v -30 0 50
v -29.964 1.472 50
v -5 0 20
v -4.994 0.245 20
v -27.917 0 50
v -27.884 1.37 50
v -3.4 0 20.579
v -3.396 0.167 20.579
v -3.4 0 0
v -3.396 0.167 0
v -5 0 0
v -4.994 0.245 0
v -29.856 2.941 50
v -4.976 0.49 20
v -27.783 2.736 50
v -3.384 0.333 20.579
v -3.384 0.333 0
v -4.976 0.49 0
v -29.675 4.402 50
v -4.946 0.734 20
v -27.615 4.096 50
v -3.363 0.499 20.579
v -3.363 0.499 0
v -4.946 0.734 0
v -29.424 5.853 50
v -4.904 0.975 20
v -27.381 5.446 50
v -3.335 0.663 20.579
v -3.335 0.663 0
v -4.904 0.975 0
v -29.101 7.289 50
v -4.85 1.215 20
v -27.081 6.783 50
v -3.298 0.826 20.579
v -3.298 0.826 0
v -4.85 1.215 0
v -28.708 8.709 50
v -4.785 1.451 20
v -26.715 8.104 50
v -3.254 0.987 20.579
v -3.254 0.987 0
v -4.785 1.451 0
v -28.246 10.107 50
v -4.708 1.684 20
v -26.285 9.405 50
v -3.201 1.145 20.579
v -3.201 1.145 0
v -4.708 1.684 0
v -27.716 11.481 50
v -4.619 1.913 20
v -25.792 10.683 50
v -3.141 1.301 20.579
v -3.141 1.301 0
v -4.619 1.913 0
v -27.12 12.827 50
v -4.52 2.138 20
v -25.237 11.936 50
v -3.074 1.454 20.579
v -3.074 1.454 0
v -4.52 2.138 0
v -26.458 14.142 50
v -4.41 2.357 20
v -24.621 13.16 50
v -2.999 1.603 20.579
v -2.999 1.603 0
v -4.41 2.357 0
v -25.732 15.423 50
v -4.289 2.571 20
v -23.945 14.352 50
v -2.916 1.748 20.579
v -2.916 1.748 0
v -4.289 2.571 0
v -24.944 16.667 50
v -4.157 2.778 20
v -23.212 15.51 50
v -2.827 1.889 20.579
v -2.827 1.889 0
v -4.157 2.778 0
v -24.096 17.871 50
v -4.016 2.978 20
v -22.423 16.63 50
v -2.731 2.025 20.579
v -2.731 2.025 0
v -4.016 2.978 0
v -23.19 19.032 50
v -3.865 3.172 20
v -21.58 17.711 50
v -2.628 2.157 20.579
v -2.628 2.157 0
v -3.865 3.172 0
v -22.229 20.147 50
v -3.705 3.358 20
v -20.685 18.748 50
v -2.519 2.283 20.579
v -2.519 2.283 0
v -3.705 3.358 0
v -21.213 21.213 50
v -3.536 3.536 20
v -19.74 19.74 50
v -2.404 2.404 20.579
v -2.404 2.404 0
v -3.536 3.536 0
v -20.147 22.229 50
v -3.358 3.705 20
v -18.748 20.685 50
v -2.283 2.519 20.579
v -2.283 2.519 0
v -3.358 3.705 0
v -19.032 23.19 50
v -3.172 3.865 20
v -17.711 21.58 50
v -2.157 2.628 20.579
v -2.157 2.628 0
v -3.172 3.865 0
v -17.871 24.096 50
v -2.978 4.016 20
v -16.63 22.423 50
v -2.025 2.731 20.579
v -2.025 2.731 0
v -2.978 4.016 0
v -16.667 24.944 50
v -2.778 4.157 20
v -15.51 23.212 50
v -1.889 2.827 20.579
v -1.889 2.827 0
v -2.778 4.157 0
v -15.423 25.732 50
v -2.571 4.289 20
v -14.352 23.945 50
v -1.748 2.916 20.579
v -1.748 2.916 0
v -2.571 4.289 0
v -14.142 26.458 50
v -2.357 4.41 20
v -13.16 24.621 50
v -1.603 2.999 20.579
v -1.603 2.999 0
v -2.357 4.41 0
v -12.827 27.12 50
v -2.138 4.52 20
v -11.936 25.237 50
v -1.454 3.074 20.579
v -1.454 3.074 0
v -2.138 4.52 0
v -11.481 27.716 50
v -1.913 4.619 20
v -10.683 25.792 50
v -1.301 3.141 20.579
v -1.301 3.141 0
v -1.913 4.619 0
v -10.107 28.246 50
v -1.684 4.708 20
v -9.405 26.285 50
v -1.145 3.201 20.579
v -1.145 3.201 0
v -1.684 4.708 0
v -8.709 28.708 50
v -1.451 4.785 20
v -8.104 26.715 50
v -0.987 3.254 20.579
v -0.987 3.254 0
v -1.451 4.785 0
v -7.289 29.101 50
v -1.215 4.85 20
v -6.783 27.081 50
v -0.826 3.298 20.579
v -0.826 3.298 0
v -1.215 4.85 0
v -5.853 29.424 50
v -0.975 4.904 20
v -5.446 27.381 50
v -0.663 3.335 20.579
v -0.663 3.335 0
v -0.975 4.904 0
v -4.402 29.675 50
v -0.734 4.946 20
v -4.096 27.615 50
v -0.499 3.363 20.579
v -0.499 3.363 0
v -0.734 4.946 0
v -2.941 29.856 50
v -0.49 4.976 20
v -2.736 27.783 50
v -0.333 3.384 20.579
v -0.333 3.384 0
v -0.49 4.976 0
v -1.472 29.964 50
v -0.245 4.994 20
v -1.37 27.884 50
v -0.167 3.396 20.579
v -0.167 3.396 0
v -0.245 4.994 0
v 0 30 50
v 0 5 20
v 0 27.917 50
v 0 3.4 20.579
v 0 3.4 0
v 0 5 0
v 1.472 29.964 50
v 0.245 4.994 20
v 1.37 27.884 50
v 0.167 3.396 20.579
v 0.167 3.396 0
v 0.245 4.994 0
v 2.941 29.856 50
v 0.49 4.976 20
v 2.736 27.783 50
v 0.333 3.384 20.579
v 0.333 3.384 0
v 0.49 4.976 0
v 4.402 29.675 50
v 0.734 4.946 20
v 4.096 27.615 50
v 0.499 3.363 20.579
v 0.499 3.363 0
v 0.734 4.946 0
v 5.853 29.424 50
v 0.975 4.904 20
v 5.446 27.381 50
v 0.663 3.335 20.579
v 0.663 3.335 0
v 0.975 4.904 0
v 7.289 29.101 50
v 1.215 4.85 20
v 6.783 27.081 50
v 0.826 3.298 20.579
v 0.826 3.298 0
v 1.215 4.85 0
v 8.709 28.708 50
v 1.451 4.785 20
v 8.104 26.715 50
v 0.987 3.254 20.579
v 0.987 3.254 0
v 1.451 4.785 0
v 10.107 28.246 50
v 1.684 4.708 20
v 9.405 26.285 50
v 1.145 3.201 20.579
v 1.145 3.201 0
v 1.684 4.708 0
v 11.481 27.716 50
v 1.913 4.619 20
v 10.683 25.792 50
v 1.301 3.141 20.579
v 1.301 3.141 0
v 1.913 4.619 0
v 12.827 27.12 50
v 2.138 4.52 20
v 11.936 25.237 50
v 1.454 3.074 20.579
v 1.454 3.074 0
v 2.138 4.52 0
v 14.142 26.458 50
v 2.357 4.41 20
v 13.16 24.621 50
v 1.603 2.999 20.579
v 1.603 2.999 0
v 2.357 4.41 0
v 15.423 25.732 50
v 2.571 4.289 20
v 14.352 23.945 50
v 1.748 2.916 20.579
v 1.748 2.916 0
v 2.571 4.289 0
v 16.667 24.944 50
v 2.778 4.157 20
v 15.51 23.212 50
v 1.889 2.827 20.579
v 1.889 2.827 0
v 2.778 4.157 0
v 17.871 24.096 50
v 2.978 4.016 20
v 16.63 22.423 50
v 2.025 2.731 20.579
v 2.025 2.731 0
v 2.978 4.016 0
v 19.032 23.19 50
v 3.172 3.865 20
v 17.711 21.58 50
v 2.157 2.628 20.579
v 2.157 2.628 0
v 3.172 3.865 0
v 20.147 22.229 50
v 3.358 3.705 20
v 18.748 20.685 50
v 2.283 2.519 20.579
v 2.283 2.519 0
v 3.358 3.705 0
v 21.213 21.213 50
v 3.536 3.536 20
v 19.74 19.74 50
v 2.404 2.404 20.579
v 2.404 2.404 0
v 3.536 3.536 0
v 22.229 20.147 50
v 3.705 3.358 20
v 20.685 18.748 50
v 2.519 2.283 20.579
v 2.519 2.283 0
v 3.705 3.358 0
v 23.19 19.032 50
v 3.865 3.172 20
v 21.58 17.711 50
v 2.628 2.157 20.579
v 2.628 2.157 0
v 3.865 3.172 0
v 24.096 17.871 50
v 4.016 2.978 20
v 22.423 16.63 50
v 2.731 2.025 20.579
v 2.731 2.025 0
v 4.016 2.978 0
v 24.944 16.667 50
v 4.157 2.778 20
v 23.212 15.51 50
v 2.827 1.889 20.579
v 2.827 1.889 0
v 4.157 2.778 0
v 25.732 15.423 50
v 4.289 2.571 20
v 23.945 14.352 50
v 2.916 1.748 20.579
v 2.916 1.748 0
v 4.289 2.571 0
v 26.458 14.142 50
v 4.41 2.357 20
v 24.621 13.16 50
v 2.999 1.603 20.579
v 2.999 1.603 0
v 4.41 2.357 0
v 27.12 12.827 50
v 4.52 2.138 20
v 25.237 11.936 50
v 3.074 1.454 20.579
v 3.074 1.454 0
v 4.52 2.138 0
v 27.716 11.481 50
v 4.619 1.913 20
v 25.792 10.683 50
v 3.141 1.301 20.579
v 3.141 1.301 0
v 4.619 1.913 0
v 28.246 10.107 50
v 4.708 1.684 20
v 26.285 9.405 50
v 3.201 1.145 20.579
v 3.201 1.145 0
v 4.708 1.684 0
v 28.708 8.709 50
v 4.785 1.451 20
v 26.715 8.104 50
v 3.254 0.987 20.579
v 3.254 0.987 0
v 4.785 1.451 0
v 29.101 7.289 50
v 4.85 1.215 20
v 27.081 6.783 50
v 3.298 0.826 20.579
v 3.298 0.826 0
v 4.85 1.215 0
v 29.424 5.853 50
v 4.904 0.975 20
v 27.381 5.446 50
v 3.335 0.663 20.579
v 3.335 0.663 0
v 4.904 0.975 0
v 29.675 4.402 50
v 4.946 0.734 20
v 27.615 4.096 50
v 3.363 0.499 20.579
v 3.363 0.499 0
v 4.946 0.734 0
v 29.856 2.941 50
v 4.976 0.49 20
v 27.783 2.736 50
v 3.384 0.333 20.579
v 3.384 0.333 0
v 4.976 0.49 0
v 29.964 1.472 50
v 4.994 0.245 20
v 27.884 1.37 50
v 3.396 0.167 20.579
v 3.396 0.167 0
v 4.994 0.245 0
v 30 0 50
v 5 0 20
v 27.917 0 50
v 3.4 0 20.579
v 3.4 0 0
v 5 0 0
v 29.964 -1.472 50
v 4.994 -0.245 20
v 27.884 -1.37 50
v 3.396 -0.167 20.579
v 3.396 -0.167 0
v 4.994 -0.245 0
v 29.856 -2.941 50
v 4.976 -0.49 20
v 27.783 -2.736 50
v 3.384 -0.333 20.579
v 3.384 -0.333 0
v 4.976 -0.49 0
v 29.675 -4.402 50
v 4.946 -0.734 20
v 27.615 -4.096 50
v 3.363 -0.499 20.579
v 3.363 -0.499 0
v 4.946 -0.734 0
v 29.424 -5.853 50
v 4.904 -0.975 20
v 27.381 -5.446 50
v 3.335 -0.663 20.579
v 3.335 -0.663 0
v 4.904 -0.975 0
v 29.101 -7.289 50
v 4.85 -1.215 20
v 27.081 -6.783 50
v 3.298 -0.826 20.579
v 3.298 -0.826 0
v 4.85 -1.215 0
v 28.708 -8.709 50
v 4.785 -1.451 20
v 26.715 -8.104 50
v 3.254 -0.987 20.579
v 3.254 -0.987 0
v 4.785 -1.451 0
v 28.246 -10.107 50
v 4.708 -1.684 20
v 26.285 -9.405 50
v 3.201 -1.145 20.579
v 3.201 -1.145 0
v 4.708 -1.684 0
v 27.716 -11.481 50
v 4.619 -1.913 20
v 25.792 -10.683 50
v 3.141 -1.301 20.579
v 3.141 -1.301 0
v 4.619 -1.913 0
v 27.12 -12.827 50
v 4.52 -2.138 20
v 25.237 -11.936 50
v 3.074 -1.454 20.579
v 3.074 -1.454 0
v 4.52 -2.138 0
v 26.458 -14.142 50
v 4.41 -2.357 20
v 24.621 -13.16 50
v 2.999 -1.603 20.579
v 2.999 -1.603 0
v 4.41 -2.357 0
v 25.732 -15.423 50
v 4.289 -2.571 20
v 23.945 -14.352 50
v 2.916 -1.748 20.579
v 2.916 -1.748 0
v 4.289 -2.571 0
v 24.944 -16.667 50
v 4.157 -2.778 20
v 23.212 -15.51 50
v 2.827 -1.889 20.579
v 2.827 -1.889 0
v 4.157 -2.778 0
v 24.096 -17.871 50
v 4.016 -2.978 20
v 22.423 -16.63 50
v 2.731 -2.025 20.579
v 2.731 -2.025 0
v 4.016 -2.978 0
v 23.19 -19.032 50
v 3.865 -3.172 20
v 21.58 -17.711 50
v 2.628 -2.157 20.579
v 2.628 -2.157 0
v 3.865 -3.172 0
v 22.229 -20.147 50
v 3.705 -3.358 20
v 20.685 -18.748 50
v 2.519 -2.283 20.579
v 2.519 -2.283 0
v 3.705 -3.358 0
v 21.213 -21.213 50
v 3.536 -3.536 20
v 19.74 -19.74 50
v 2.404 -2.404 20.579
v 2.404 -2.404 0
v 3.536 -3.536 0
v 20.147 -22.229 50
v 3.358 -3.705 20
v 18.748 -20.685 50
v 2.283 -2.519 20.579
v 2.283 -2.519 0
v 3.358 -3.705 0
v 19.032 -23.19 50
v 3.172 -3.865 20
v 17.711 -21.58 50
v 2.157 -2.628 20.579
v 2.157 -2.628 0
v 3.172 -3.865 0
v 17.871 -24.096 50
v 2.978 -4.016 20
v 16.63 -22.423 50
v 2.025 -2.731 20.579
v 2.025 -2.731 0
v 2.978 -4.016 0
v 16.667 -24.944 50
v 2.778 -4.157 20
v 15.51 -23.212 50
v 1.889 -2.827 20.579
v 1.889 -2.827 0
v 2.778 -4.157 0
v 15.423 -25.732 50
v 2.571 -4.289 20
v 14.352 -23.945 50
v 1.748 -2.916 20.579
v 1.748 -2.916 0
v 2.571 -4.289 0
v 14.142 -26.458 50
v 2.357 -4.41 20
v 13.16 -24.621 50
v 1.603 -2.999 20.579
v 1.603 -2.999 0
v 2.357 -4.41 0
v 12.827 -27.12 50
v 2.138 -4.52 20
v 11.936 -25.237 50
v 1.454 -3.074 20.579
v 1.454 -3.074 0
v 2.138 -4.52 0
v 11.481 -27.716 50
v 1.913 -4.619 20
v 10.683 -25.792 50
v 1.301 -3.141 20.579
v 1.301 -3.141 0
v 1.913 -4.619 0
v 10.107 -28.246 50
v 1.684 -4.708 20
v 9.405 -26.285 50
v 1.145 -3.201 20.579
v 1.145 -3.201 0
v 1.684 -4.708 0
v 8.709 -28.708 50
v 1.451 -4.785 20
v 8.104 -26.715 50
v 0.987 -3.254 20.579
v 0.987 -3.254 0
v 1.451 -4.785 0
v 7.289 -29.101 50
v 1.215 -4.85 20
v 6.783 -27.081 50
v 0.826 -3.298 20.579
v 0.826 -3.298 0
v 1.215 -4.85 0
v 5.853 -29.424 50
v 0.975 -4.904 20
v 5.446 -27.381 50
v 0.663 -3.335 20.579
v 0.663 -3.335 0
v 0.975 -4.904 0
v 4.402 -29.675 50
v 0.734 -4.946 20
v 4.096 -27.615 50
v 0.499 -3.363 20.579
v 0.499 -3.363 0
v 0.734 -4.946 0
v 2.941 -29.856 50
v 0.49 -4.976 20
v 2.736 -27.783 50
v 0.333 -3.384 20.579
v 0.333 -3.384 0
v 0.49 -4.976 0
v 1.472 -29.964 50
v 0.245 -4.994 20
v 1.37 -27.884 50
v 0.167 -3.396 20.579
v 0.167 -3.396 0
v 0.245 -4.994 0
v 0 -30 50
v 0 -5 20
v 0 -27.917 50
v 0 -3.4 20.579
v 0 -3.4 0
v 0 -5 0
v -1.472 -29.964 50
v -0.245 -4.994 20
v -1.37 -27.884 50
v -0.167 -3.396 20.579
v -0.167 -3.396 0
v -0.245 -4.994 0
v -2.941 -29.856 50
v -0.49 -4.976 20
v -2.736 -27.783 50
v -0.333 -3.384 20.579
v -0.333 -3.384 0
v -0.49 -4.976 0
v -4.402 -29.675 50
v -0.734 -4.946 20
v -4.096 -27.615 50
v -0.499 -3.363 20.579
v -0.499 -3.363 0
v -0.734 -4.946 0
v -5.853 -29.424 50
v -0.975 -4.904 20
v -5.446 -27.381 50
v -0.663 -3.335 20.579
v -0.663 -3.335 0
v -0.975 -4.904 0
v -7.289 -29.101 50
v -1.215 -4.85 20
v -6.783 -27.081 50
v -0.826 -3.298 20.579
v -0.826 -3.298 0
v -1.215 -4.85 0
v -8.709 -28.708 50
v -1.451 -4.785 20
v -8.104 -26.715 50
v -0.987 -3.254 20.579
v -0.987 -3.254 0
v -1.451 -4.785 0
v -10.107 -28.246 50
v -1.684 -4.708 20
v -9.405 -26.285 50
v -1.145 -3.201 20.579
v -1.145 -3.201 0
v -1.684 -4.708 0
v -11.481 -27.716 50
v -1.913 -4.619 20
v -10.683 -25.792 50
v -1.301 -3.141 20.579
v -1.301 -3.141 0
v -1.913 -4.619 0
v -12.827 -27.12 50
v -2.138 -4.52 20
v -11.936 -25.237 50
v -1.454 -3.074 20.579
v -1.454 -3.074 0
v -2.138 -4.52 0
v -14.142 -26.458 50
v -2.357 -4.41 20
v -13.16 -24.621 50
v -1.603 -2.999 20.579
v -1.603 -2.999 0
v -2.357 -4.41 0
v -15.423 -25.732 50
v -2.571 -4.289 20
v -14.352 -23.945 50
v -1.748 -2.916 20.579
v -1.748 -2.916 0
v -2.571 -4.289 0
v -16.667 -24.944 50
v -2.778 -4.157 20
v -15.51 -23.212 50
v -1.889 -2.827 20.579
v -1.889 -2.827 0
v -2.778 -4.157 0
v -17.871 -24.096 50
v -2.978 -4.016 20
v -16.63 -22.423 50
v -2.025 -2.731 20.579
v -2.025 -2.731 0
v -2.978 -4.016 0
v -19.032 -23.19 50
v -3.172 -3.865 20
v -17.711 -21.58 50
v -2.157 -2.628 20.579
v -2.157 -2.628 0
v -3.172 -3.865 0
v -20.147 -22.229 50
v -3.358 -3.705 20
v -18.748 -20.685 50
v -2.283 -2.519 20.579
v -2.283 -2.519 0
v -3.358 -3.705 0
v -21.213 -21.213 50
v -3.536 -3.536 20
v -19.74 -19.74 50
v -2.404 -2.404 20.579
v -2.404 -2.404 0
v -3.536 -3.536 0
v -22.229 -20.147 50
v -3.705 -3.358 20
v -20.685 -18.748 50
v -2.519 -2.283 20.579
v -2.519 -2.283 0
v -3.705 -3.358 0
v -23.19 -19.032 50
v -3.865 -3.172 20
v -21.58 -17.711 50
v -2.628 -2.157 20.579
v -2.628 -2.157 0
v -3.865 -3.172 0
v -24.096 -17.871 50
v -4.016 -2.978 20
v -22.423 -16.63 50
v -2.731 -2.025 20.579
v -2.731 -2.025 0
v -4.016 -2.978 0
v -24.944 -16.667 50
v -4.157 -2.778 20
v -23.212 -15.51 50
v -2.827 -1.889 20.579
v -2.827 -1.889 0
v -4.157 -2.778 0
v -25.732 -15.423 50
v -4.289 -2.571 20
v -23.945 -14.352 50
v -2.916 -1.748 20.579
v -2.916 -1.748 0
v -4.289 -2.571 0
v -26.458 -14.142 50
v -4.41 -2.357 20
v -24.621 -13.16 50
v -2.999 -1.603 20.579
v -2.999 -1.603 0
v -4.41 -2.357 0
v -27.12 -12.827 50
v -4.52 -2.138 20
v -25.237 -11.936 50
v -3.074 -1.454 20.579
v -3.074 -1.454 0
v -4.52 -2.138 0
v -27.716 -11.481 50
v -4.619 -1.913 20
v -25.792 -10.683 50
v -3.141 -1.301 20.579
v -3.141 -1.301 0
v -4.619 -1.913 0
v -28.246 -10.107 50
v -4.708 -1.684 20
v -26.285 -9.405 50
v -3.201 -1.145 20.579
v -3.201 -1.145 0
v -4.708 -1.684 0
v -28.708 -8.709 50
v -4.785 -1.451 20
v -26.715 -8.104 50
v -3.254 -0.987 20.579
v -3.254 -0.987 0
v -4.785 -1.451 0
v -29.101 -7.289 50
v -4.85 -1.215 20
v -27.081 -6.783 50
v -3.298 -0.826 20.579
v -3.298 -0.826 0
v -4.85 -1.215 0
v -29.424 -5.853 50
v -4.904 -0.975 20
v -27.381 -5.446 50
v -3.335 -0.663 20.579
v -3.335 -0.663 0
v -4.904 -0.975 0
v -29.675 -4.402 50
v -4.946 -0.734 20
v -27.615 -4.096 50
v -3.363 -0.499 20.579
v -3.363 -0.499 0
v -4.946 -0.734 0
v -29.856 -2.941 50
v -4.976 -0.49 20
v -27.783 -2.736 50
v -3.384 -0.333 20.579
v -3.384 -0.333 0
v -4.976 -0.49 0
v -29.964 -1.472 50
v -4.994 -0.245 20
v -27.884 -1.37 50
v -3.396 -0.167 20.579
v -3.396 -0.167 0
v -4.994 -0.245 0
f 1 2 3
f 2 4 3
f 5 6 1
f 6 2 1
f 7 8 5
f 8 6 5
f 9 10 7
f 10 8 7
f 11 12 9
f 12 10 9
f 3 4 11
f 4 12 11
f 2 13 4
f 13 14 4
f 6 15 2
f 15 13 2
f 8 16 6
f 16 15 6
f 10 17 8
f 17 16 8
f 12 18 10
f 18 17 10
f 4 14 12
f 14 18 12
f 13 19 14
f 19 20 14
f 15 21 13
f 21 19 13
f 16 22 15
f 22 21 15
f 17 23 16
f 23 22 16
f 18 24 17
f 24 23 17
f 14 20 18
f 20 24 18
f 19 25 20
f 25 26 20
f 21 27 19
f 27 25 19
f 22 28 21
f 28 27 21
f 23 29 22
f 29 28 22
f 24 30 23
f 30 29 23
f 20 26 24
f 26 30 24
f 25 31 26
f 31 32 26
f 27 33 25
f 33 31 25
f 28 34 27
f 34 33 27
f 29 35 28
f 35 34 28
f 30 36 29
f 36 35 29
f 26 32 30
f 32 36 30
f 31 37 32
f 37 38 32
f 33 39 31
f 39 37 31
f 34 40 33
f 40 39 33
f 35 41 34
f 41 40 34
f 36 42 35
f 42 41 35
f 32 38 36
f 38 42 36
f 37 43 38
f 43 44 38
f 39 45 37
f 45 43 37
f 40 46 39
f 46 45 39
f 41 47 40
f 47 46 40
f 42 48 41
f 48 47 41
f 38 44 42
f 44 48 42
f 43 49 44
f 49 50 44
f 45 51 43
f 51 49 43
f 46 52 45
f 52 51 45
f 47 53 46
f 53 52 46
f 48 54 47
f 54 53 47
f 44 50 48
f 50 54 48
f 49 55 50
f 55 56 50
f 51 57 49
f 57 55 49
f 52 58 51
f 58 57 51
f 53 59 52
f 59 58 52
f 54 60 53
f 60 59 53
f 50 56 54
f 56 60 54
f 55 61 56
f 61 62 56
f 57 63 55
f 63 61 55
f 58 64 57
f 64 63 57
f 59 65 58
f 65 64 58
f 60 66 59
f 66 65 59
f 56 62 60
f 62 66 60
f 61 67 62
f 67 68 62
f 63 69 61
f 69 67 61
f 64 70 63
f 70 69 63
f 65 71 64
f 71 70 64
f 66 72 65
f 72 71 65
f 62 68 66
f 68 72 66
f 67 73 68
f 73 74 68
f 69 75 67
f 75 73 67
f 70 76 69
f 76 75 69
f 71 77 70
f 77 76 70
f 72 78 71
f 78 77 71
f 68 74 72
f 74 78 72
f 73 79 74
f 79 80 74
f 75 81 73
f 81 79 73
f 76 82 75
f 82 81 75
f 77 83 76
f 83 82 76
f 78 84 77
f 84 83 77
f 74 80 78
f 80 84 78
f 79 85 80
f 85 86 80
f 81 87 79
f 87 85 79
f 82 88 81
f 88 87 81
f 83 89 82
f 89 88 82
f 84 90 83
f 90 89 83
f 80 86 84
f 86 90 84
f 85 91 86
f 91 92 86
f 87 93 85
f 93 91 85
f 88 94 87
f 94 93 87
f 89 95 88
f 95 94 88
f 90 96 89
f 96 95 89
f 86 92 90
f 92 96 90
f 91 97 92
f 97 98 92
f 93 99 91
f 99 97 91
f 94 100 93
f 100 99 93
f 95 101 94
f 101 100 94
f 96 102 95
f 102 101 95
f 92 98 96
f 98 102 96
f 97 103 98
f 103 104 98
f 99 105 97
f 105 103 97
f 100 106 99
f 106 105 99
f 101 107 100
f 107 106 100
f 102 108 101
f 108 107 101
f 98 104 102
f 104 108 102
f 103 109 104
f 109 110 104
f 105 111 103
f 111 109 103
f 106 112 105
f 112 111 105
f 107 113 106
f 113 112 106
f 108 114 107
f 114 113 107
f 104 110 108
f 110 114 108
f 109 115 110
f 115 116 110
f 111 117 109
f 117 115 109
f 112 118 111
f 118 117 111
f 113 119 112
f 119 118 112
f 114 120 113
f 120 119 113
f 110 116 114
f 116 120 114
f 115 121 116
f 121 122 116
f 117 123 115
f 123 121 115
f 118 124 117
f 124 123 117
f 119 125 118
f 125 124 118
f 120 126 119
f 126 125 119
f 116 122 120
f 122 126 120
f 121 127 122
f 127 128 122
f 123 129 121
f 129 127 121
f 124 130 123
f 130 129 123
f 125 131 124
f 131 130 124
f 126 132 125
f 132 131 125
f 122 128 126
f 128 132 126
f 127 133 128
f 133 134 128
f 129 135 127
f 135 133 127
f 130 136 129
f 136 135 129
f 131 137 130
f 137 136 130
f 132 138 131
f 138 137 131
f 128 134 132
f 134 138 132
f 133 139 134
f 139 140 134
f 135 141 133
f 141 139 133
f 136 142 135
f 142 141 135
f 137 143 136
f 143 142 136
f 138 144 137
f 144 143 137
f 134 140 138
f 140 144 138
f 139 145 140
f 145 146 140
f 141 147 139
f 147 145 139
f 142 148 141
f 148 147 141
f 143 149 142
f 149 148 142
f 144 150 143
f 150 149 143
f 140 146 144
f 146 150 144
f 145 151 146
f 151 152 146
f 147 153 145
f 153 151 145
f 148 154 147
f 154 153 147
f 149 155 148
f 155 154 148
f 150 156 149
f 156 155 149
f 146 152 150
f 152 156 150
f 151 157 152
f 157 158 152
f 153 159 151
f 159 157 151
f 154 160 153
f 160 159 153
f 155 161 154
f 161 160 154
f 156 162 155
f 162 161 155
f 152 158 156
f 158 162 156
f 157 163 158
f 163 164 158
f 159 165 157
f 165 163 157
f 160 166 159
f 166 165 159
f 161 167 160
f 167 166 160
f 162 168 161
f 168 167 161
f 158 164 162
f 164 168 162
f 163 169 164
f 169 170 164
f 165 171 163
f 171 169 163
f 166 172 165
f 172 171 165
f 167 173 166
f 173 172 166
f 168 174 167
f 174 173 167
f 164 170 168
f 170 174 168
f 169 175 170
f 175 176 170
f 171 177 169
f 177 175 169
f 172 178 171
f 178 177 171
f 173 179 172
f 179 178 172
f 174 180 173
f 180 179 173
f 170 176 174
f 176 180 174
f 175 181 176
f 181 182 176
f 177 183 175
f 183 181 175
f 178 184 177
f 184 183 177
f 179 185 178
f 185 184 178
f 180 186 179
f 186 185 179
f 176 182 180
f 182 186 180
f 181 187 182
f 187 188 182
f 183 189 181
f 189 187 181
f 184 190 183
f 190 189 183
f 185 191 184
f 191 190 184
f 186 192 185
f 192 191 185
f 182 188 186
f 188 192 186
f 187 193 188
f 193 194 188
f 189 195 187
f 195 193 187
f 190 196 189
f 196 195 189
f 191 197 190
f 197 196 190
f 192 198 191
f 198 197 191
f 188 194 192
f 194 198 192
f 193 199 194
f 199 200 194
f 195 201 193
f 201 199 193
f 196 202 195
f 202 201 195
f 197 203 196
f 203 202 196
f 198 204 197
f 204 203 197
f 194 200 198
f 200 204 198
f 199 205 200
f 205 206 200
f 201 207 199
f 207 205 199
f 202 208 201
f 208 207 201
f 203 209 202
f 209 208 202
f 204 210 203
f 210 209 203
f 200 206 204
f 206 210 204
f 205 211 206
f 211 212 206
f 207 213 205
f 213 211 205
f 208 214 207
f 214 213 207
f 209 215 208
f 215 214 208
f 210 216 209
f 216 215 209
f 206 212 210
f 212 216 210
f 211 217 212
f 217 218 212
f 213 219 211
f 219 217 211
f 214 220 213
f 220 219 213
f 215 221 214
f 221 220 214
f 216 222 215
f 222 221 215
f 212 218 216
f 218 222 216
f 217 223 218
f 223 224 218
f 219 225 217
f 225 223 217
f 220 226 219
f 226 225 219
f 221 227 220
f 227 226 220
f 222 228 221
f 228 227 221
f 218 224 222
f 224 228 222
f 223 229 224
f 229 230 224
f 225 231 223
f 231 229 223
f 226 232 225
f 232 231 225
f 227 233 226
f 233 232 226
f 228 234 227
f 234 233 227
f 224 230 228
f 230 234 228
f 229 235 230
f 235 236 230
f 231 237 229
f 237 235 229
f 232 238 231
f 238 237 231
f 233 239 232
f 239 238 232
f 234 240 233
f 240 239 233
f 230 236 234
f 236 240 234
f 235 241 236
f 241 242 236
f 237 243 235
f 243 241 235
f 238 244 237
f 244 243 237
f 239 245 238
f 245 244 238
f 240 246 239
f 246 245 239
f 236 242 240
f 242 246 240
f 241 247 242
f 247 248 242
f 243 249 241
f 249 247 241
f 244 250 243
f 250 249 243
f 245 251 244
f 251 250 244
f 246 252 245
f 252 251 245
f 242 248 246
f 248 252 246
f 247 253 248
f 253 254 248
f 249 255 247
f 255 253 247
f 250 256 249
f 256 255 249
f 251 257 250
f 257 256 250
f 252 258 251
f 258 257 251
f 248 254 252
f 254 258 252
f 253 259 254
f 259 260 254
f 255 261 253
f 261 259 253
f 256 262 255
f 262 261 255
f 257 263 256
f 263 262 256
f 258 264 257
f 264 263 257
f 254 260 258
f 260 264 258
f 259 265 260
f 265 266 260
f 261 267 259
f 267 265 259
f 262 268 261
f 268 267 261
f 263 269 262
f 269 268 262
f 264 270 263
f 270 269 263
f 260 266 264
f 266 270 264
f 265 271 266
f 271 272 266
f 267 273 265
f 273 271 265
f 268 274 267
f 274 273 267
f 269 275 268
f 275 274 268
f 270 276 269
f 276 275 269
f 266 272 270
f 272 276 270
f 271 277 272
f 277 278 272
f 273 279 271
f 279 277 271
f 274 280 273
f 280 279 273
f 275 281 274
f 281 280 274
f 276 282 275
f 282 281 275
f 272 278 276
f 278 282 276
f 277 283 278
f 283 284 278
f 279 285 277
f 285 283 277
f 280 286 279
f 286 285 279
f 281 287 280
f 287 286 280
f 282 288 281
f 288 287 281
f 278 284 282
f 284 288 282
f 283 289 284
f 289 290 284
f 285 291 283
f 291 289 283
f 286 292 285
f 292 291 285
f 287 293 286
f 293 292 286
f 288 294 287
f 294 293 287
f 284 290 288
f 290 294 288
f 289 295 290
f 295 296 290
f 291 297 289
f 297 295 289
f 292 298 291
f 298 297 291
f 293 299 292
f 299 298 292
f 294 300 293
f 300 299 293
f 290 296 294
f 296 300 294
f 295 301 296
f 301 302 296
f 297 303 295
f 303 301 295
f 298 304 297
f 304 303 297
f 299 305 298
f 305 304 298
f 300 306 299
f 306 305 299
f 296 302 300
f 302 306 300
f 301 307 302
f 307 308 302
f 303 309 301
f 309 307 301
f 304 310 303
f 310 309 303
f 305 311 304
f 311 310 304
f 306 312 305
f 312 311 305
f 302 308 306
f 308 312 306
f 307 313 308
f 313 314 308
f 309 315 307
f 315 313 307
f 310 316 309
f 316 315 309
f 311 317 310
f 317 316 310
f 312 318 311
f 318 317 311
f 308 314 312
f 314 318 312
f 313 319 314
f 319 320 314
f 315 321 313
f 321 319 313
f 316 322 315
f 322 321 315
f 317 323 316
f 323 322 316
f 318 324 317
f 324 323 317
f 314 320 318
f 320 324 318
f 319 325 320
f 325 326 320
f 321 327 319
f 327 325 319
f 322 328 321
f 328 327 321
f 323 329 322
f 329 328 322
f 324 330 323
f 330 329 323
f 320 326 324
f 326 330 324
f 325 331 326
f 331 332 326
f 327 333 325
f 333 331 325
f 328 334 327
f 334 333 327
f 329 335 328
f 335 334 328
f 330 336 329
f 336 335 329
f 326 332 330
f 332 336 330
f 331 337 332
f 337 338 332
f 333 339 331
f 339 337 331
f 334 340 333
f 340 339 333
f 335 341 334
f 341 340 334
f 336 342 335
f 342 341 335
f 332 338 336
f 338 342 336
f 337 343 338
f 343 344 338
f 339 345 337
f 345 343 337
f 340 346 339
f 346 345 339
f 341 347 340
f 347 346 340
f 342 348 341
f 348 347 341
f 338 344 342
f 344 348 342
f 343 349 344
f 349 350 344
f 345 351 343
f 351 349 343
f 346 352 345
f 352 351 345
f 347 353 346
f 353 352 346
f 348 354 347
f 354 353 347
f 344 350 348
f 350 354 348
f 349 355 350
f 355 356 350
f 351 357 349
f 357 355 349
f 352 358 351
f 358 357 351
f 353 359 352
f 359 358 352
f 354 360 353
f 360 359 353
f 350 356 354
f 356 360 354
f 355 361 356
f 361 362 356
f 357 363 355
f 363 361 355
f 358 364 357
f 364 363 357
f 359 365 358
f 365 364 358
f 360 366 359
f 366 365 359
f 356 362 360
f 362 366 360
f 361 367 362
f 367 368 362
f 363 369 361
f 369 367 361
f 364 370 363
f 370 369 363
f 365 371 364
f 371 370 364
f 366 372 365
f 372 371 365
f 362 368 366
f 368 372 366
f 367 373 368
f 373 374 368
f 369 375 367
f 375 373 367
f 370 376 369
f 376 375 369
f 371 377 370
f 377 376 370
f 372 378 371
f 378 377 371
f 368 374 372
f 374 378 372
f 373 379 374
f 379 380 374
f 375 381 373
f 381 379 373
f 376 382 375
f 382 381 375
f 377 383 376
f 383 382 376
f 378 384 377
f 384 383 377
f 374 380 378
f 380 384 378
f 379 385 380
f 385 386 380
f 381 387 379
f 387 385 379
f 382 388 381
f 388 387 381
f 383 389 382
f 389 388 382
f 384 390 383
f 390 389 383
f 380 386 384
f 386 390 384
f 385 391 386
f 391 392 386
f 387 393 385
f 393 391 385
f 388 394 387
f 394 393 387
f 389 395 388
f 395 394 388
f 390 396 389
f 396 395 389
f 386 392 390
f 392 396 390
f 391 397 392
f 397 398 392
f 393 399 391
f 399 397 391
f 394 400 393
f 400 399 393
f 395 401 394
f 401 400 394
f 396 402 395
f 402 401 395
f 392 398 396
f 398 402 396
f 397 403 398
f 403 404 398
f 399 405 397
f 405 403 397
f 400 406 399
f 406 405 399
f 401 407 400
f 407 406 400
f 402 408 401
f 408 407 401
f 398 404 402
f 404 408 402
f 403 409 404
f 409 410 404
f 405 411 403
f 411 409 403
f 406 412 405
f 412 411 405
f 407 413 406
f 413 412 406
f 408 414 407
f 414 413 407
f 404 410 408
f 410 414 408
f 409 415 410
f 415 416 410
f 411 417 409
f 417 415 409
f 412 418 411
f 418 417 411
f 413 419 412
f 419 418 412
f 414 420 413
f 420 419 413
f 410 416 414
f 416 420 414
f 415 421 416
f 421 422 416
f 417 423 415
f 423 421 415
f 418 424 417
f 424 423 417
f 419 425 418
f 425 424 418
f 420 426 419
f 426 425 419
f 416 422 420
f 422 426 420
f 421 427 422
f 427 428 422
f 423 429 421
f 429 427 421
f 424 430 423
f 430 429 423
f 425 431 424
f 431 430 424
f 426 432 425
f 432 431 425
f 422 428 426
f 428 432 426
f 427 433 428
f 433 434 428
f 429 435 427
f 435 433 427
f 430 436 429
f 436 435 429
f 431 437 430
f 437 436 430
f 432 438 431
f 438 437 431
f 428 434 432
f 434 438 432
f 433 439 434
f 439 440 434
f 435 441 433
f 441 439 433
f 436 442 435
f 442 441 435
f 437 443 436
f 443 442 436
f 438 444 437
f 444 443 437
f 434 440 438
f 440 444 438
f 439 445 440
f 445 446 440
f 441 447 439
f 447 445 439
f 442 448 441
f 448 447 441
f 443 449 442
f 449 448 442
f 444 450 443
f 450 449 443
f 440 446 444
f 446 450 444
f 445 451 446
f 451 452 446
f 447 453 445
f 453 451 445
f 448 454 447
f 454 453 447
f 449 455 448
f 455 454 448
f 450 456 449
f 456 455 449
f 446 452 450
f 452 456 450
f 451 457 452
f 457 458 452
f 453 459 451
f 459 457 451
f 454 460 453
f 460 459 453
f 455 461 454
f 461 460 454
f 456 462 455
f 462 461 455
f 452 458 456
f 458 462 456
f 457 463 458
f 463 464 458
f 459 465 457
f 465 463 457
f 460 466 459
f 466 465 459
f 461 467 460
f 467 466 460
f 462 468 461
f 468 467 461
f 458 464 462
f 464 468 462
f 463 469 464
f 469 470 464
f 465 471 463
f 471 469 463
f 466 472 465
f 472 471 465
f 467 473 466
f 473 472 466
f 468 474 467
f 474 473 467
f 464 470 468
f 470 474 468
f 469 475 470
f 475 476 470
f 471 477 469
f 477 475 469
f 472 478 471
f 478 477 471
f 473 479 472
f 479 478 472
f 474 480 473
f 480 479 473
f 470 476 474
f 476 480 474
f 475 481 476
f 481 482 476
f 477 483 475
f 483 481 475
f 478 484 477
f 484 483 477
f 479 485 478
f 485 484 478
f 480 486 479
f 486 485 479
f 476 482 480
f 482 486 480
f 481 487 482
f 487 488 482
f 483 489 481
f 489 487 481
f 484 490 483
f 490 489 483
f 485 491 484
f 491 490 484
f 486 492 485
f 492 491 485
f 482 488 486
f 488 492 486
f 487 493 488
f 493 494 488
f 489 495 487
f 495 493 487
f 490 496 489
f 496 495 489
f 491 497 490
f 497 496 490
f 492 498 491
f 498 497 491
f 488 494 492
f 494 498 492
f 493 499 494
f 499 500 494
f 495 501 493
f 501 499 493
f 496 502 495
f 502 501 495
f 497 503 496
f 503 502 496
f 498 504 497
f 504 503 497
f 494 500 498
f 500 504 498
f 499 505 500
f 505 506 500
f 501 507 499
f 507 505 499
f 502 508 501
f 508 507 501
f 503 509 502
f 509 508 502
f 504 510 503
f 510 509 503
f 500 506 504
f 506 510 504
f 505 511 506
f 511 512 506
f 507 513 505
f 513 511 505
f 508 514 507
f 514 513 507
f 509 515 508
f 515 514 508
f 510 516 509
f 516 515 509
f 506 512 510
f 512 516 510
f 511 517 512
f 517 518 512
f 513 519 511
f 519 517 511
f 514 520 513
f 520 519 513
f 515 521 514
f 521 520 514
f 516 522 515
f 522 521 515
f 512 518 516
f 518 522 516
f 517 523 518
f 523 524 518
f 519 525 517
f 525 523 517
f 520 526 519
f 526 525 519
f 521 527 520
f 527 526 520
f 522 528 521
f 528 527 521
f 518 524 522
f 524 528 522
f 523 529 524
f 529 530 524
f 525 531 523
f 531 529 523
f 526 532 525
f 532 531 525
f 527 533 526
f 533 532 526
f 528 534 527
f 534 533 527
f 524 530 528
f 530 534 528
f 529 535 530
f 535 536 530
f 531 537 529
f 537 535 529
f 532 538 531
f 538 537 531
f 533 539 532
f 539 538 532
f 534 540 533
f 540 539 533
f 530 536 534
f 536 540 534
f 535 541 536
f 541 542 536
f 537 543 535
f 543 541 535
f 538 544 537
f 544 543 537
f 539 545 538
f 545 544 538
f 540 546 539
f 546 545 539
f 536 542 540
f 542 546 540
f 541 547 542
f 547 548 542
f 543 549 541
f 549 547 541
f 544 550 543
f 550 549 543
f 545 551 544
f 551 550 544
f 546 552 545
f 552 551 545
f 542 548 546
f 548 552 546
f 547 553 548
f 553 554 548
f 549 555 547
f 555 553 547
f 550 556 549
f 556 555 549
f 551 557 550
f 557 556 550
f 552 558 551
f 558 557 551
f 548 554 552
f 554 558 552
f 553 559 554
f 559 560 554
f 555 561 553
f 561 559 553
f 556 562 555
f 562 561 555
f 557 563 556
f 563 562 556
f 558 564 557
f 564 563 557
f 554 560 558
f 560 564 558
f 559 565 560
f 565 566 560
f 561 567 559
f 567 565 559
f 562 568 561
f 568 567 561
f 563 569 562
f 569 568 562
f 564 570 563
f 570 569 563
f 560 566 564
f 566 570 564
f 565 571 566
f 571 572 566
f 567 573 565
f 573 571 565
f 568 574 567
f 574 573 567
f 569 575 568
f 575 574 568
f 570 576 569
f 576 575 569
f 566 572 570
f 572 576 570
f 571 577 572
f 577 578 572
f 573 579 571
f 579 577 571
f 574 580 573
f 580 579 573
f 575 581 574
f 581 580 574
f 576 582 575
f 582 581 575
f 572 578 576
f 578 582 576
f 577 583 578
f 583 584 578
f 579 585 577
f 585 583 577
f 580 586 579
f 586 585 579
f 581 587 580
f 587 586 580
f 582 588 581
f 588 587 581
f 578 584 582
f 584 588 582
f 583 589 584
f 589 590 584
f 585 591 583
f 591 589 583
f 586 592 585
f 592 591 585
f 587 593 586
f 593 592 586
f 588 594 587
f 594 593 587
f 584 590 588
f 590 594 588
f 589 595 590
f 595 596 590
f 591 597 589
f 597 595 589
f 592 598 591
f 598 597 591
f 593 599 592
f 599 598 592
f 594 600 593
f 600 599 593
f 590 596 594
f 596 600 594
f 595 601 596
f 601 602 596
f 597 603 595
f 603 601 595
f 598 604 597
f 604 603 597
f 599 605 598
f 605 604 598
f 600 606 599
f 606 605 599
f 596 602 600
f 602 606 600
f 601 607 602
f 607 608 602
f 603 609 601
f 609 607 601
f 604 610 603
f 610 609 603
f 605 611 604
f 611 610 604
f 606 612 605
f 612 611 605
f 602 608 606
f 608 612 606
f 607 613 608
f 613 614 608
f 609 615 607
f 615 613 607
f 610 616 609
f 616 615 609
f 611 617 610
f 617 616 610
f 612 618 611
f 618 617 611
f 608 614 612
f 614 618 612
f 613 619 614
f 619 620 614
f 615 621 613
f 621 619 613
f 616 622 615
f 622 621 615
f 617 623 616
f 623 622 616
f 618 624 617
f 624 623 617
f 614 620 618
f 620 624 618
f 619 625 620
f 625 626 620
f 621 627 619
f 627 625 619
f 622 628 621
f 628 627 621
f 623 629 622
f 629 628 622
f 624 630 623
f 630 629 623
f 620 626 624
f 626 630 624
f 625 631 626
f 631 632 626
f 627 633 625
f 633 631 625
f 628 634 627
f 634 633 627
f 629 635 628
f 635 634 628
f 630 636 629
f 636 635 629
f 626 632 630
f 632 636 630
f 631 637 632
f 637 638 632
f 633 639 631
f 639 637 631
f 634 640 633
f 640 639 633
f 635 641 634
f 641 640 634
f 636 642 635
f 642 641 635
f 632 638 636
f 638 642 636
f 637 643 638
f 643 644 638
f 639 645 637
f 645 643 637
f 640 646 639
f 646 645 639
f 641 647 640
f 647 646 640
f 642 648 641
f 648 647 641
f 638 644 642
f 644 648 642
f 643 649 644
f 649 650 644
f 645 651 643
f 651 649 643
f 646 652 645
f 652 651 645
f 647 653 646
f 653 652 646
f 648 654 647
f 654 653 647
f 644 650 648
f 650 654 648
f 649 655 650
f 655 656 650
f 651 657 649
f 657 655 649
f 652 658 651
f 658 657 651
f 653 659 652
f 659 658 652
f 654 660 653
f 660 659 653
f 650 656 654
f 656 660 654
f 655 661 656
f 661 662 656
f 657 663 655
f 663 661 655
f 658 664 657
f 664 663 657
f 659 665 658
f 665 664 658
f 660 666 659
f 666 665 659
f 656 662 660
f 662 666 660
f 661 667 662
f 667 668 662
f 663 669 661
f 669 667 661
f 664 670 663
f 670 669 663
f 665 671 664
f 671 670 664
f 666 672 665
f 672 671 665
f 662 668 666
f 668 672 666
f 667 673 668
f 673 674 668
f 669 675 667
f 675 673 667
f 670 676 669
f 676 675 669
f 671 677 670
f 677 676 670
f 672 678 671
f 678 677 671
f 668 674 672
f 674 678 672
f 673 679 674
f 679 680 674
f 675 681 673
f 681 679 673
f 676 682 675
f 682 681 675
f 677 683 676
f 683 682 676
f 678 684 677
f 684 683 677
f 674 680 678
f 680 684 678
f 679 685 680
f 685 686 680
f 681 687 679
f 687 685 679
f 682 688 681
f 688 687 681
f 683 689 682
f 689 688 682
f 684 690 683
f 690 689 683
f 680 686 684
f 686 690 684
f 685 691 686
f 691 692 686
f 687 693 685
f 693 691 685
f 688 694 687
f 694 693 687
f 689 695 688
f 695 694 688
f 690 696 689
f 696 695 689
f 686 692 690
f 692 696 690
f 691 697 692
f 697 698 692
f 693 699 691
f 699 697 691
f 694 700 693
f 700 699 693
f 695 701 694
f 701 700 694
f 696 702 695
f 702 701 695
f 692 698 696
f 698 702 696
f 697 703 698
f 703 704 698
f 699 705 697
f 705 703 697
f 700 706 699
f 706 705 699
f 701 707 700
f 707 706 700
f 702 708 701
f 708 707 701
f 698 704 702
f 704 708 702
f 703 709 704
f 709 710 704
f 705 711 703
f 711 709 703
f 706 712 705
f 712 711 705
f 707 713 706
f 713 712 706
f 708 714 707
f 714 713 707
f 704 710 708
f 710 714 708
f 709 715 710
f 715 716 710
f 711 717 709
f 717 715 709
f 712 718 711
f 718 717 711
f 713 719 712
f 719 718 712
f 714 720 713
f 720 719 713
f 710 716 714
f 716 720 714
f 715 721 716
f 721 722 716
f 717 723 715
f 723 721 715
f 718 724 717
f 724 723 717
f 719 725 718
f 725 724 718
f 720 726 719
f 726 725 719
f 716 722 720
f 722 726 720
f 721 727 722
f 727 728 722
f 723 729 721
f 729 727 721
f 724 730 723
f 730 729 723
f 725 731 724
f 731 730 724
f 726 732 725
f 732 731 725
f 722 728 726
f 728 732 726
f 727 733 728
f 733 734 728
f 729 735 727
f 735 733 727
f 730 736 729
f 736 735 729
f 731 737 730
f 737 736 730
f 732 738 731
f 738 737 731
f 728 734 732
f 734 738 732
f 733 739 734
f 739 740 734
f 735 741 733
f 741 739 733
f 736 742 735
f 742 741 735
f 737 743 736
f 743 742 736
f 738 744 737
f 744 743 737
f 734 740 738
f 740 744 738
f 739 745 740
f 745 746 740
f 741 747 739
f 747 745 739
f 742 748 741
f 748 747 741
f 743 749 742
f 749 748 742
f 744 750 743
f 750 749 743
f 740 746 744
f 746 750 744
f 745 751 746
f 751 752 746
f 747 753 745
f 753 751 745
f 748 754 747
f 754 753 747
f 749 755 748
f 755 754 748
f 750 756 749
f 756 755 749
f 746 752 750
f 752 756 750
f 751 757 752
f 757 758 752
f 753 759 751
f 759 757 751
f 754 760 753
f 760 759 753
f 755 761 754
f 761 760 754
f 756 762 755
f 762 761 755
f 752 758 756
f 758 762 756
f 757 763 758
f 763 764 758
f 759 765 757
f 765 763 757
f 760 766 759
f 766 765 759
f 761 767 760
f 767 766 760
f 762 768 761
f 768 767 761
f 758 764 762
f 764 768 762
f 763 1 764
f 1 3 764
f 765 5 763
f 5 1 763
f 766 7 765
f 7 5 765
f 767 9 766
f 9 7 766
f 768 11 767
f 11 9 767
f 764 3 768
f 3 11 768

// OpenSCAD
// Small lab funnel - printed upright, wide opening at top
// Built as a single rotate_extrude of the wall cross-section,
// so the funnel is open at both ends.

$fn = 128;                 // smoothness of round surfaces

// ---------------- Dimensions (mm) ----------------
spout_od      = 10;        // spout outer diameter
spout_h       = 20;        // spout height (z = 0 .. 20)
rim_od        = 60;        // cone outer diameter at rim
rim_z         = 50;        // rim height
wall          = 1.6;       // wall thickness (normal to surface)

// ---------------- Derived values ----------------
spout_r       = spout_od / 2;                 // 5.0  outer spout radius
bore_r        = spout_r - wall;               // 3.4  spout bore radius (6.8 mm bore)
rim_r         = rim_od / 2;                   // 30.0 outer rim radius
cone_h        = rim_z - spout_h;              // 30.0 cone height
cone_k        = (rim_r - spout_r) / cone_h;   // radial growth per mm of height
// Horizontal offset that gives a true 1.6 mm wall perpendicular to the cone side
cone_off      = wall * sqrt(1 + cone_k * cone_k);
// Height where the inner cone surface meets the spout bore
join_z        = spout_h + (cone_off - wall) / cone_k;
rim_inner_r   = rim_r - cone_off;             // inner radius at rim

// ---------------- Model ----------------
rotate_extrude(convexity = 4)
    polygon(points = [
        [bore_r,      0],        // bottom of bore
        [spout_r,     0],        // bottom outer edge
        [spout_r,     spout_h],  // top of straight spout
        [rim_r,       rim_z],    // outer rim
        [rim_inner_r, rim_z],    // inner rim
        [bore_r,      join_z]    // inner cone meets bore
    ]);
